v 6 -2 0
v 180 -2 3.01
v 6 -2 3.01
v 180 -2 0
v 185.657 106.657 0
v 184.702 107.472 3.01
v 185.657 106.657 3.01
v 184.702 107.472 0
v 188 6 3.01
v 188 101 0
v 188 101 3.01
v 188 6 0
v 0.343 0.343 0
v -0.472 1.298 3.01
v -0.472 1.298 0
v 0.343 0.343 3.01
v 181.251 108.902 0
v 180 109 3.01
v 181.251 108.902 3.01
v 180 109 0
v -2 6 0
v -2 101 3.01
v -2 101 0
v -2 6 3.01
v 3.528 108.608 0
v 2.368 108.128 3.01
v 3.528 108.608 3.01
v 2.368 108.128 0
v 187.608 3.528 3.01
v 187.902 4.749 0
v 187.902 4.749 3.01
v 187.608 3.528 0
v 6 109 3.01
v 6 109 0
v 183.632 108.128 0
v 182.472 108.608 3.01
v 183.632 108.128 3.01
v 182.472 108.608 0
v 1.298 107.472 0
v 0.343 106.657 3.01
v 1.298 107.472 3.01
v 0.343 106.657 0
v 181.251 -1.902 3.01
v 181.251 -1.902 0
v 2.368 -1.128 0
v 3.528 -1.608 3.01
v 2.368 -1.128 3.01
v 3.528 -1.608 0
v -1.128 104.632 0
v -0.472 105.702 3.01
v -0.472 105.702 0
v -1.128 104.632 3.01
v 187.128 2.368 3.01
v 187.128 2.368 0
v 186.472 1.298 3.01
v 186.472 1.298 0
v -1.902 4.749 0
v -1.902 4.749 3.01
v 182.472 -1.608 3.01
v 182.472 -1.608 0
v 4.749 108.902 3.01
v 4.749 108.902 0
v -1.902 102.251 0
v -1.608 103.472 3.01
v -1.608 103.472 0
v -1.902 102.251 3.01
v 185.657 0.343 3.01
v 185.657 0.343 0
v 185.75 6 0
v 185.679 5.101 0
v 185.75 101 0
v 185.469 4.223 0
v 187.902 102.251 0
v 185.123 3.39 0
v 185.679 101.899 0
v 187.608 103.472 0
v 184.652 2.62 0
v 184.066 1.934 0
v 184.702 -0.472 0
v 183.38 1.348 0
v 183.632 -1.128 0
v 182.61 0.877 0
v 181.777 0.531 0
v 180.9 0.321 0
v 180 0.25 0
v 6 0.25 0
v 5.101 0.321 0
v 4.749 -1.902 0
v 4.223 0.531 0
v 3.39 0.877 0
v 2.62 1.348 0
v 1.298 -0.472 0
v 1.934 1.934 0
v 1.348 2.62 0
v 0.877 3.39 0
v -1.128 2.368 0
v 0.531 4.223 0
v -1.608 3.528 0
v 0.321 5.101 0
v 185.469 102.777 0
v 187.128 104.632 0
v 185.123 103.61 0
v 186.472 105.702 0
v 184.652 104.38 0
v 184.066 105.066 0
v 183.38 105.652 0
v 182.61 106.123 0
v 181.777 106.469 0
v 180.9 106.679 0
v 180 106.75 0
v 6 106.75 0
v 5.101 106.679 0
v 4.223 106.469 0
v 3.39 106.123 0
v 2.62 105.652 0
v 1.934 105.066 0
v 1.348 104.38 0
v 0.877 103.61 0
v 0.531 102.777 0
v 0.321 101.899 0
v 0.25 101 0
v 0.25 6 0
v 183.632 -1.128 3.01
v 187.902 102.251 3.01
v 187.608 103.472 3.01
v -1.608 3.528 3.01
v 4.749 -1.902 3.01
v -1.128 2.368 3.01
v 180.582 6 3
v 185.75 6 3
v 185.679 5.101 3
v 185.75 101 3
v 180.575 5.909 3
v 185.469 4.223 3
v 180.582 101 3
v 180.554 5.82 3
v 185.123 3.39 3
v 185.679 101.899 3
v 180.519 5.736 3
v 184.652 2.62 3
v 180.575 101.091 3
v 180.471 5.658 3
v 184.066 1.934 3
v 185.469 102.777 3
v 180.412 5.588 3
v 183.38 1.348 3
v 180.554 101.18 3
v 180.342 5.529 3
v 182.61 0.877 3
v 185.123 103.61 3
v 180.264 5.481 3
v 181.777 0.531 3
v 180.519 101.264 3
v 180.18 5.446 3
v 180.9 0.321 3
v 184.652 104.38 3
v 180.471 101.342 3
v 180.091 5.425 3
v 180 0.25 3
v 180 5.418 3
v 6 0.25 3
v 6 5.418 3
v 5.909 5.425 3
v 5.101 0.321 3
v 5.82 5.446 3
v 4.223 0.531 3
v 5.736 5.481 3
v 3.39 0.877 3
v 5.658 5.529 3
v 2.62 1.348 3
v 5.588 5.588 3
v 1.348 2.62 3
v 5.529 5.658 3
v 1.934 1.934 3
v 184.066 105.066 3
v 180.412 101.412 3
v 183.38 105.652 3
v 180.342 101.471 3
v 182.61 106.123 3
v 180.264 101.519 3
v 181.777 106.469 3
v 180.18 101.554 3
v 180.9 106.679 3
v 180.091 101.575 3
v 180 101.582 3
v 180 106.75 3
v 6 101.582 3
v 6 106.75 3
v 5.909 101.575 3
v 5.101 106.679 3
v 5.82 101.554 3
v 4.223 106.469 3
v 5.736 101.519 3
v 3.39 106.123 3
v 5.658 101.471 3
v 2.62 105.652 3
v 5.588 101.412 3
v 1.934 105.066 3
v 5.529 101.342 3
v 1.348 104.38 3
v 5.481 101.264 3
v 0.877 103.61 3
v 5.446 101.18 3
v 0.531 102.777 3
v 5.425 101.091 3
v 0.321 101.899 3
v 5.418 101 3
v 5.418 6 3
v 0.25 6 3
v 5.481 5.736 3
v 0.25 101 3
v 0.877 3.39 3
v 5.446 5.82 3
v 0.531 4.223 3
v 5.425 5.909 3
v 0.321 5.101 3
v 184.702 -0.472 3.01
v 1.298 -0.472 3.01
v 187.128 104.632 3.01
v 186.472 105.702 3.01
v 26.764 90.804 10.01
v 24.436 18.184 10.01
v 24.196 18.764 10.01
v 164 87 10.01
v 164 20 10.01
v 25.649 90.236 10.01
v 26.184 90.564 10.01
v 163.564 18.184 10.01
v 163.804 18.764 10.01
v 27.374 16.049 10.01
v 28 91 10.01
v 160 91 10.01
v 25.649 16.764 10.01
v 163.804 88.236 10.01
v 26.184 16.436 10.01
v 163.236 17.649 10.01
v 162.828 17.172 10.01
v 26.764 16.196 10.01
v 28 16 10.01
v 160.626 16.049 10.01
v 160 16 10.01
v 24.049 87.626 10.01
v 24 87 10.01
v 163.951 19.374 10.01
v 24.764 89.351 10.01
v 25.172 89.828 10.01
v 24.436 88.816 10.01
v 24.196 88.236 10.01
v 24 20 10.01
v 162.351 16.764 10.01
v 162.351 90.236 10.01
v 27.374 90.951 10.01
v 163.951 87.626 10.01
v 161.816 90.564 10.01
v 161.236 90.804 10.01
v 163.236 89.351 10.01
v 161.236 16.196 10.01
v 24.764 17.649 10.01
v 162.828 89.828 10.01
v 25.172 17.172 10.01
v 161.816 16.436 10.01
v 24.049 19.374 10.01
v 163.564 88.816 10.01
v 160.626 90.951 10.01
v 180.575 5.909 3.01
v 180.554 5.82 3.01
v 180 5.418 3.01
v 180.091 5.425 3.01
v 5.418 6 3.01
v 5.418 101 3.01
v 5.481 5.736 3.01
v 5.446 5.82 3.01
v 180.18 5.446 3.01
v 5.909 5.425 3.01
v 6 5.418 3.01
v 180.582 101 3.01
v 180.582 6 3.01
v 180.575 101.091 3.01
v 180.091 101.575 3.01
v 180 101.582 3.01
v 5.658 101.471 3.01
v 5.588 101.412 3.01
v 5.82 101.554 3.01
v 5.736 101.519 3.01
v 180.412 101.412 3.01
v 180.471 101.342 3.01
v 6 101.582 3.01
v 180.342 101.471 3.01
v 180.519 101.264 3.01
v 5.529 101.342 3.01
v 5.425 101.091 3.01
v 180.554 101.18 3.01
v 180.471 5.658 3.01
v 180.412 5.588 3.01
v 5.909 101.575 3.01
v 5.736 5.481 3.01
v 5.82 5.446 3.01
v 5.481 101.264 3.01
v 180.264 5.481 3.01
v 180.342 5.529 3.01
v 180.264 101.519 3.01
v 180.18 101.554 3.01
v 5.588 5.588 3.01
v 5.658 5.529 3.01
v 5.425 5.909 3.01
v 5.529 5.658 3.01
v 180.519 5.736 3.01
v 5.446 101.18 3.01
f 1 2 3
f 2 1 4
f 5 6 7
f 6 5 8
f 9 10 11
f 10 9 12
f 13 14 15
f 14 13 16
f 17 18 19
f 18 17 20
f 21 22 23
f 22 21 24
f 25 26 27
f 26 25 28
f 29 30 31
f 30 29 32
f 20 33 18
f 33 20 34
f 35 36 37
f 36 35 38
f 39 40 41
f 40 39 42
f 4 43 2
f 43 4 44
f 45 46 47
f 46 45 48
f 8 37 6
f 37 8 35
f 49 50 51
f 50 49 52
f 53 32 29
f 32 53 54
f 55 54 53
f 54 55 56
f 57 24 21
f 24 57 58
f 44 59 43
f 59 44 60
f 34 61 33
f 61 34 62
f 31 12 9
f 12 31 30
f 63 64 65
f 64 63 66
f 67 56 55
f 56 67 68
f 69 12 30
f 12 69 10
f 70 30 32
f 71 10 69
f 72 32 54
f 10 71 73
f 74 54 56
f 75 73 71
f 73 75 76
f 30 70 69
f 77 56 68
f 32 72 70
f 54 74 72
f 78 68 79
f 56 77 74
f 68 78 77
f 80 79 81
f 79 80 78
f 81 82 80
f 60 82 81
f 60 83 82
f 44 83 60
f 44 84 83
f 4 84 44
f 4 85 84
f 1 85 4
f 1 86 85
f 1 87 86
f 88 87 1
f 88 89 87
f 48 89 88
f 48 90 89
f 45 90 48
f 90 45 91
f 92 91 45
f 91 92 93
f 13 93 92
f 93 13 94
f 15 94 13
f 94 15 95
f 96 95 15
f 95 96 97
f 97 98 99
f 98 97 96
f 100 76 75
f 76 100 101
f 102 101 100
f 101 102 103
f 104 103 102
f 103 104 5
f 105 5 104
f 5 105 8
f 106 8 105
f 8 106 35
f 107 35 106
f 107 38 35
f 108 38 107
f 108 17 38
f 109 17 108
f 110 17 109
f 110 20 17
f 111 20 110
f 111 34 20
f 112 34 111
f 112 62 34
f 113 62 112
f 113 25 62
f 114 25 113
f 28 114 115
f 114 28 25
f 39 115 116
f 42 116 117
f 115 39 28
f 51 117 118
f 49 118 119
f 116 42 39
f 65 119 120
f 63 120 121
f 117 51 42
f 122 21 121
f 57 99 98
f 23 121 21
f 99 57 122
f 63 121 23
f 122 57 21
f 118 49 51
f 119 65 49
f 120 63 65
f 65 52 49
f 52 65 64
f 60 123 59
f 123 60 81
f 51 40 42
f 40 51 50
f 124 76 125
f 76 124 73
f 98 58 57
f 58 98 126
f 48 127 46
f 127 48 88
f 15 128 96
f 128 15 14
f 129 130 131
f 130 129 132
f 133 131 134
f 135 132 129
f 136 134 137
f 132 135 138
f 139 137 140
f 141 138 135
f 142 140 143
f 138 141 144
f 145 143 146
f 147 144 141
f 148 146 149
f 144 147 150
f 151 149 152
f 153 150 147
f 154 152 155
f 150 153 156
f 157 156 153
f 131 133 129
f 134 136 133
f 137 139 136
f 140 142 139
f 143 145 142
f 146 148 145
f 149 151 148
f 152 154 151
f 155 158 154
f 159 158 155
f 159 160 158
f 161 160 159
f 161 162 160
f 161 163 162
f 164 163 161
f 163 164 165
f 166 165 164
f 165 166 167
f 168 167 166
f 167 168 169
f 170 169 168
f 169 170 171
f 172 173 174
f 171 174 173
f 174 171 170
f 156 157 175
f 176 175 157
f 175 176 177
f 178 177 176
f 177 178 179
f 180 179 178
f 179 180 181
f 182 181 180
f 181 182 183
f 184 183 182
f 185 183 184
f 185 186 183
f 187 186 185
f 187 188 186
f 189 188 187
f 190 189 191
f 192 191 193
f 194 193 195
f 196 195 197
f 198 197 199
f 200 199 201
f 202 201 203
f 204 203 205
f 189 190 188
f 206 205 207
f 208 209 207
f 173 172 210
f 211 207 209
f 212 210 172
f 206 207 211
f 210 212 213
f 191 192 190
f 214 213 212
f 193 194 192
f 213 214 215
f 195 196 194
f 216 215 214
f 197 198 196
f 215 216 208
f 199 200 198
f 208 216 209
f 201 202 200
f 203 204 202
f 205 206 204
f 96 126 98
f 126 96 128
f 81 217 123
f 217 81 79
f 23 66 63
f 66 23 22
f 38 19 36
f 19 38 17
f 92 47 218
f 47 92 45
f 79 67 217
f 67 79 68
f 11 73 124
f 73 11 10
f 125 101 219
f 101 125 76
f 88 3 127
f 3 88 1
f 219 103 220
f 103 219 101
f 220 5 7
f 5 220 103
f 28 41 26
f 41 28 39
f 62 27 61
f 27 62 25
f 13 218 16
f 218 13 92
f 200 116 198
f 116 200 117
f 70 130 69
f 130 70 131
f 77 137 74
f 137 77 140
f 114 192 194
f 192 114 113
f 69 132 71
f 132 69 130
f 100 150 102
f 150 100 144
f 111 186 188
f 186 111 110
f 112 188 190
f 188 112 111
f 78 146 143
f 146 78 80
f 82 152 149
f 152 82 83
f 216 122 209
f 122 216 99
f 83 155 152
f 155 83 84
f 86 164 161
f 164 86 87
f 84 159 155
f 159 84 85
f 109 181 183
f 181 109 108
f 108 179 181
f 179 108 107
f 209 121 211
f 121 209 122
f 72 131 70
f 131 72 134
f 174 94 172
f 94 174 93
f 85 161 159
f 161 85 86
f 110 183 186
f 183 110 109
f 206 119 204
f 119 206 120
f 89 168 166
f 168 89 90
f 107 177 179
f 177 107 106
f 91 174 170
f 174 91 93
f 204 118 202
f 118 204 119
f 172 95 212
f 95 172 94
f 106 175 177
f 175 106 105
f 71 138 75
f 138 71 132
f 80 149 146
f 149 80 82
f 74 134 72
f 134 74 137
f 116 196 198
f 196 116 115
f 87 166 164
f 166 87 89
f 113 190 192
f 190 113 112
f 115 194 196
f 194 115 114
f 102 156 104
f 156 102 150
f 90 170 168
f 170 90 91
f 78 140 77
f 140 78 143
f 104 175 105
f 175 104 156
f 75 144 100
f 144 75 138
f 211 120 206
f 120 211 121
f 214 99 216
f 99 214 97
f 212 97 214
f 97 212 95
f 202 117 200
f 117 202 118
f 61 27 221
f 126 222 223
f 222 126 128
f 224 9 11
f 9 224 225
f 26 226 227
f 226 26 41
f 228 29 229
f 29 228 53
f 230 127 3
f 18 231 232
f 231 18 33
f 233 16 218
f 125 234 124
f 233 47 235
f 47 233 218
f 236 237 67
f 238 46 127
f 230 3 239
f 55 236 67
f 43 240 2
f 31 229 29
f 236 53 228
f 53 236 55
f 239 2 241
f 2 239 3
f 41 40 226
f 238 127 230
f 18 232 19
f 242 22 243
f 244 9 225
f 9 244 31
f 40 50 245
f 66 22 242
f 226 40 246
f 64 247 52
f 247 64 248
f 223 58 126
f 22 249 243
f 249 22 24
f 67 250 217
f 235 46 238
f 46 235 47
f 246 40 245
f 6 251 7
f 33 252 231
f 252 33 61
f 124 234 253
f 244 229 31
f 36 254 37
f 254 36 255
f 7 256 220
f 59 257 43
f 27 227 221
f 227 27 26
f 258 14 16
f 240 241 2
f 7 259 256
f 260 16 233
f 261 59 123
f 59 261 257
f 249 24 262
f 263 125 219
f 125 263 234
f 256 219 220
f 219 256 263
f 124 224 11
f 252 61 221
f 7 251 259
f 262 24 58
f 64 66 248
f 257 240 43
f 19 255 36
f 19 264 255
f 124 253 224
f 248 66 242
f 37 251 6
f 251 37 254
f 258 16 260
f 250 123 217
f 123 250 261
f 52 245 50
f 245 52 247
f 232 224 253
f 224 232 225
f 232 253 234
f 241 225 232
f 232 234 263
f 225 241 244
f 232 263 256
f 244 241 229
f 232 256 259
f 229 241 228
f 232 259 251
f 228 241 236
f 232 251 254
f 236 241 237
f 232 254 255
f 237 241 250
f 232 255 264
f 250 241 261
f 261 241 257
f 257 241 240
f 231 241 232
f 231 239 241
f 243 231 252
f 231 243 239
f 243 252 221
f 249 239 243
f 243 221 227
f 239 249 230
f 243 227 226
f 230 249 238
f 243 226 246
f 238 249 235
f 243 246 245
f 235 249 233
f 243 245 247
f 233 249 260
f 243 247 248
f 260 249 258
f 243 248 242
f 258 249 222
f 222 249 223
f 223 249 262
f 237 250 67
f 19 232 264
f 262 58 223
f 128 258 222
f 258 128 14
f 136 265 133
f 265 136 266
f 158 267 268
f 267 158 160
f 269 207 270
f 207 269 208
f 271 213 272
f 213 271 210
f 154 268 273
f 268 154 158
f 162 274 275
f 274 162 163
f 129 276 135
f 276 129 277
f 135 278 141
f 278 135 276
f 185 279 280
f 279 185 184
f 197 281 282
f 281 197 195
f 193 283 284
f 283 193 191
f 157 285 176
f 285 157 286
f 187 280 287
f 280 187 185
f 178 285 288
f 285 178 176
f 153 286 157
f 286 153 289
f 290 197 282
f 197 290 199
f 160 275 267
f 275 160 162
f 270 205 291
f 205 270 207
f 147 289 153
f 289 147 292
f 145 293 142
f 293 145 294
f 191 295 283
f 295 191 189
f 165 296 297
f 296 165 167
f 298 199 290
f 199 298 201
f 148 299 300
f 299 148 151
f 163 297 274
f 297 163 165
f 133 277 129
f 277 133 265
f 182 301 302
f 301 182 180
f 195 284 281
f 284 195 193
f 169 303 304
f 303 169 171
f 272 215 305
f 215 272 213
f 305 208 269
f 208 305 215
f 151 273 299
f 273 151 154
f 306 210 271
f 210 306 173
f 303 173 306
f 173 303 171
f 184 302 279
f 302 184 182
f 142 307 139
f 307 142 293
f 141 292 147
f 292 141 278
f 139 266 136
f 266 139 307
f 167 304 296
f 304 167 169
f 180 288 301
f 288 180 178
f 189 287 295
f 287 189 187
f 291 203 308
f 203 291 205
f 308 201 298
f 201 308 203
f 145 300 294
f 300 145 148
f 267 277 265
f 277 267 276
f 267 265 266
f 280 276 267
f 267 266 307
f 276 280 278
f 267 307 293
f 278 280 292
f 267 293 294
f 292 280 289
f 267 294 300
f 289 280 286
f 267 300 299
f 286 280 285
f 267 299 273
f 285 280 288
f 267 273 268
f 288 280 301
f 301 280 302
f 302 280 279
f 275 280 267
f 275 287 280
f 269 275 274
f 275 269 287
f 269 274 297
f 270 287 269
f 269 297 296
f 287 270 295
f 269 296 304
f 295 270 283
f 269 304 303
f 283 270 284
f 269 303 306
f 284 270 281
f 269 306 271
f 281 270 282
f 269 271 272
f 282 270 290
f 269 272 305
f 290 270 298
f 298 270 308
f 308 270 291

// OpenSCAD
// file: params.scad
$fn = 40;

wall = 2;
w = 162;    // w rzeczywistości jest o 5mm mniej
d = 83;     // w rzeczywistości jest o 5mm mniej
h = 10;
r = 6;

cut_w = 12;
cut_h = 10;
cut_z = 2;

margin = 12;        // +2mm aby wtyczka kabla weszła 
flange_h = wall;
screw_r = 2;
screw_offset = 8;
skirt_h = wall + 1;
skirt_wall = 2;
fit_clearance = 0.25;

flange_w = w + 2*margin;
flange_d = d + 2*margin;

x_start = margin + wall + 10;
x_end   = margin + w - wall - 8;
opening_lx = x_end - x_start;

y_start = margin + wall + 2;
y_end   = margin + d - wall - 2;
opening_ly = y_end - y_start;


opening_r = 4;

desired_wall = 2;   // faktyczna grubość ścianki, jaką chcesz mieć (prostopadle do skosu)

rise = h - skirt_h;
run_x = (flange_w + 2*skirt_wall - opening_lx) / 2;
run_y = (flange_d + 2*skirt_wall - opening_ly) / 2;

// bierzemy bardziej płaski kierunek (większy run = cieńsza ścianka), żeby zagwarantować
// minimum wszędzie
run_max = max(run_x, run_y);
slant = sqrt(rise*rise + run_max*run_max);

top_wall = desired_wall * slant / rise;   // to jest teraz Twój "shrink" w XY

module rounded_base(w, d, h, r) {
    hull() {
        translate([r, r, 0]) cylinder(r=r, h=h);
        translate([w-r, r, 0]) cylinder(r=r, h=h);
        translate([r, d-r, 0]) cylinder(r=r, h=h);
        translate([w-r, d-r, 0]) cylinder(r=r, h=h);
    }
}
// main file
include <params.scad>

module skirt() {
    difference() {
        translate([-skirt_wall, -skirt_wall, 0])
            rounded_base(flange_w + 2*skirt_wall, flange_d + 2*skirt_wall, skirt_h, r + skirt_wall);
        translate([fit_clearance, fit_clearance, -1])
            rounded_base(flange_w - 2*fit_clearance, flange_d - 2*fit_clearance, skirt_h + 2, r - fit_clearance);
    }
}

module slope_solid(shrink) {
    hull() {
        translate([-skirt_wall+shrink, -skirt_wall+shrink, skirt_h])
            rounded_base(flange_w + 2*skirt_wall - 2*shrink, flange_d + 2*skirt_wall - 2*shrink, 0.01, r + skirt_wall - shrink);
        translate([x_start+shrink, y_start+shrink, h])
            rounded_base(opening_lx - 2*shrink, opening_ly - 2*shrink, 0.01, opening_r - shrink);
    }
}

module slope() {
    difference() {
        slope_solid(0);
        slope_solid(top_wall);
    }
}

module top_assembly(){
    union() {
        skirt();
        slope();
    }
}

top_assembly();
